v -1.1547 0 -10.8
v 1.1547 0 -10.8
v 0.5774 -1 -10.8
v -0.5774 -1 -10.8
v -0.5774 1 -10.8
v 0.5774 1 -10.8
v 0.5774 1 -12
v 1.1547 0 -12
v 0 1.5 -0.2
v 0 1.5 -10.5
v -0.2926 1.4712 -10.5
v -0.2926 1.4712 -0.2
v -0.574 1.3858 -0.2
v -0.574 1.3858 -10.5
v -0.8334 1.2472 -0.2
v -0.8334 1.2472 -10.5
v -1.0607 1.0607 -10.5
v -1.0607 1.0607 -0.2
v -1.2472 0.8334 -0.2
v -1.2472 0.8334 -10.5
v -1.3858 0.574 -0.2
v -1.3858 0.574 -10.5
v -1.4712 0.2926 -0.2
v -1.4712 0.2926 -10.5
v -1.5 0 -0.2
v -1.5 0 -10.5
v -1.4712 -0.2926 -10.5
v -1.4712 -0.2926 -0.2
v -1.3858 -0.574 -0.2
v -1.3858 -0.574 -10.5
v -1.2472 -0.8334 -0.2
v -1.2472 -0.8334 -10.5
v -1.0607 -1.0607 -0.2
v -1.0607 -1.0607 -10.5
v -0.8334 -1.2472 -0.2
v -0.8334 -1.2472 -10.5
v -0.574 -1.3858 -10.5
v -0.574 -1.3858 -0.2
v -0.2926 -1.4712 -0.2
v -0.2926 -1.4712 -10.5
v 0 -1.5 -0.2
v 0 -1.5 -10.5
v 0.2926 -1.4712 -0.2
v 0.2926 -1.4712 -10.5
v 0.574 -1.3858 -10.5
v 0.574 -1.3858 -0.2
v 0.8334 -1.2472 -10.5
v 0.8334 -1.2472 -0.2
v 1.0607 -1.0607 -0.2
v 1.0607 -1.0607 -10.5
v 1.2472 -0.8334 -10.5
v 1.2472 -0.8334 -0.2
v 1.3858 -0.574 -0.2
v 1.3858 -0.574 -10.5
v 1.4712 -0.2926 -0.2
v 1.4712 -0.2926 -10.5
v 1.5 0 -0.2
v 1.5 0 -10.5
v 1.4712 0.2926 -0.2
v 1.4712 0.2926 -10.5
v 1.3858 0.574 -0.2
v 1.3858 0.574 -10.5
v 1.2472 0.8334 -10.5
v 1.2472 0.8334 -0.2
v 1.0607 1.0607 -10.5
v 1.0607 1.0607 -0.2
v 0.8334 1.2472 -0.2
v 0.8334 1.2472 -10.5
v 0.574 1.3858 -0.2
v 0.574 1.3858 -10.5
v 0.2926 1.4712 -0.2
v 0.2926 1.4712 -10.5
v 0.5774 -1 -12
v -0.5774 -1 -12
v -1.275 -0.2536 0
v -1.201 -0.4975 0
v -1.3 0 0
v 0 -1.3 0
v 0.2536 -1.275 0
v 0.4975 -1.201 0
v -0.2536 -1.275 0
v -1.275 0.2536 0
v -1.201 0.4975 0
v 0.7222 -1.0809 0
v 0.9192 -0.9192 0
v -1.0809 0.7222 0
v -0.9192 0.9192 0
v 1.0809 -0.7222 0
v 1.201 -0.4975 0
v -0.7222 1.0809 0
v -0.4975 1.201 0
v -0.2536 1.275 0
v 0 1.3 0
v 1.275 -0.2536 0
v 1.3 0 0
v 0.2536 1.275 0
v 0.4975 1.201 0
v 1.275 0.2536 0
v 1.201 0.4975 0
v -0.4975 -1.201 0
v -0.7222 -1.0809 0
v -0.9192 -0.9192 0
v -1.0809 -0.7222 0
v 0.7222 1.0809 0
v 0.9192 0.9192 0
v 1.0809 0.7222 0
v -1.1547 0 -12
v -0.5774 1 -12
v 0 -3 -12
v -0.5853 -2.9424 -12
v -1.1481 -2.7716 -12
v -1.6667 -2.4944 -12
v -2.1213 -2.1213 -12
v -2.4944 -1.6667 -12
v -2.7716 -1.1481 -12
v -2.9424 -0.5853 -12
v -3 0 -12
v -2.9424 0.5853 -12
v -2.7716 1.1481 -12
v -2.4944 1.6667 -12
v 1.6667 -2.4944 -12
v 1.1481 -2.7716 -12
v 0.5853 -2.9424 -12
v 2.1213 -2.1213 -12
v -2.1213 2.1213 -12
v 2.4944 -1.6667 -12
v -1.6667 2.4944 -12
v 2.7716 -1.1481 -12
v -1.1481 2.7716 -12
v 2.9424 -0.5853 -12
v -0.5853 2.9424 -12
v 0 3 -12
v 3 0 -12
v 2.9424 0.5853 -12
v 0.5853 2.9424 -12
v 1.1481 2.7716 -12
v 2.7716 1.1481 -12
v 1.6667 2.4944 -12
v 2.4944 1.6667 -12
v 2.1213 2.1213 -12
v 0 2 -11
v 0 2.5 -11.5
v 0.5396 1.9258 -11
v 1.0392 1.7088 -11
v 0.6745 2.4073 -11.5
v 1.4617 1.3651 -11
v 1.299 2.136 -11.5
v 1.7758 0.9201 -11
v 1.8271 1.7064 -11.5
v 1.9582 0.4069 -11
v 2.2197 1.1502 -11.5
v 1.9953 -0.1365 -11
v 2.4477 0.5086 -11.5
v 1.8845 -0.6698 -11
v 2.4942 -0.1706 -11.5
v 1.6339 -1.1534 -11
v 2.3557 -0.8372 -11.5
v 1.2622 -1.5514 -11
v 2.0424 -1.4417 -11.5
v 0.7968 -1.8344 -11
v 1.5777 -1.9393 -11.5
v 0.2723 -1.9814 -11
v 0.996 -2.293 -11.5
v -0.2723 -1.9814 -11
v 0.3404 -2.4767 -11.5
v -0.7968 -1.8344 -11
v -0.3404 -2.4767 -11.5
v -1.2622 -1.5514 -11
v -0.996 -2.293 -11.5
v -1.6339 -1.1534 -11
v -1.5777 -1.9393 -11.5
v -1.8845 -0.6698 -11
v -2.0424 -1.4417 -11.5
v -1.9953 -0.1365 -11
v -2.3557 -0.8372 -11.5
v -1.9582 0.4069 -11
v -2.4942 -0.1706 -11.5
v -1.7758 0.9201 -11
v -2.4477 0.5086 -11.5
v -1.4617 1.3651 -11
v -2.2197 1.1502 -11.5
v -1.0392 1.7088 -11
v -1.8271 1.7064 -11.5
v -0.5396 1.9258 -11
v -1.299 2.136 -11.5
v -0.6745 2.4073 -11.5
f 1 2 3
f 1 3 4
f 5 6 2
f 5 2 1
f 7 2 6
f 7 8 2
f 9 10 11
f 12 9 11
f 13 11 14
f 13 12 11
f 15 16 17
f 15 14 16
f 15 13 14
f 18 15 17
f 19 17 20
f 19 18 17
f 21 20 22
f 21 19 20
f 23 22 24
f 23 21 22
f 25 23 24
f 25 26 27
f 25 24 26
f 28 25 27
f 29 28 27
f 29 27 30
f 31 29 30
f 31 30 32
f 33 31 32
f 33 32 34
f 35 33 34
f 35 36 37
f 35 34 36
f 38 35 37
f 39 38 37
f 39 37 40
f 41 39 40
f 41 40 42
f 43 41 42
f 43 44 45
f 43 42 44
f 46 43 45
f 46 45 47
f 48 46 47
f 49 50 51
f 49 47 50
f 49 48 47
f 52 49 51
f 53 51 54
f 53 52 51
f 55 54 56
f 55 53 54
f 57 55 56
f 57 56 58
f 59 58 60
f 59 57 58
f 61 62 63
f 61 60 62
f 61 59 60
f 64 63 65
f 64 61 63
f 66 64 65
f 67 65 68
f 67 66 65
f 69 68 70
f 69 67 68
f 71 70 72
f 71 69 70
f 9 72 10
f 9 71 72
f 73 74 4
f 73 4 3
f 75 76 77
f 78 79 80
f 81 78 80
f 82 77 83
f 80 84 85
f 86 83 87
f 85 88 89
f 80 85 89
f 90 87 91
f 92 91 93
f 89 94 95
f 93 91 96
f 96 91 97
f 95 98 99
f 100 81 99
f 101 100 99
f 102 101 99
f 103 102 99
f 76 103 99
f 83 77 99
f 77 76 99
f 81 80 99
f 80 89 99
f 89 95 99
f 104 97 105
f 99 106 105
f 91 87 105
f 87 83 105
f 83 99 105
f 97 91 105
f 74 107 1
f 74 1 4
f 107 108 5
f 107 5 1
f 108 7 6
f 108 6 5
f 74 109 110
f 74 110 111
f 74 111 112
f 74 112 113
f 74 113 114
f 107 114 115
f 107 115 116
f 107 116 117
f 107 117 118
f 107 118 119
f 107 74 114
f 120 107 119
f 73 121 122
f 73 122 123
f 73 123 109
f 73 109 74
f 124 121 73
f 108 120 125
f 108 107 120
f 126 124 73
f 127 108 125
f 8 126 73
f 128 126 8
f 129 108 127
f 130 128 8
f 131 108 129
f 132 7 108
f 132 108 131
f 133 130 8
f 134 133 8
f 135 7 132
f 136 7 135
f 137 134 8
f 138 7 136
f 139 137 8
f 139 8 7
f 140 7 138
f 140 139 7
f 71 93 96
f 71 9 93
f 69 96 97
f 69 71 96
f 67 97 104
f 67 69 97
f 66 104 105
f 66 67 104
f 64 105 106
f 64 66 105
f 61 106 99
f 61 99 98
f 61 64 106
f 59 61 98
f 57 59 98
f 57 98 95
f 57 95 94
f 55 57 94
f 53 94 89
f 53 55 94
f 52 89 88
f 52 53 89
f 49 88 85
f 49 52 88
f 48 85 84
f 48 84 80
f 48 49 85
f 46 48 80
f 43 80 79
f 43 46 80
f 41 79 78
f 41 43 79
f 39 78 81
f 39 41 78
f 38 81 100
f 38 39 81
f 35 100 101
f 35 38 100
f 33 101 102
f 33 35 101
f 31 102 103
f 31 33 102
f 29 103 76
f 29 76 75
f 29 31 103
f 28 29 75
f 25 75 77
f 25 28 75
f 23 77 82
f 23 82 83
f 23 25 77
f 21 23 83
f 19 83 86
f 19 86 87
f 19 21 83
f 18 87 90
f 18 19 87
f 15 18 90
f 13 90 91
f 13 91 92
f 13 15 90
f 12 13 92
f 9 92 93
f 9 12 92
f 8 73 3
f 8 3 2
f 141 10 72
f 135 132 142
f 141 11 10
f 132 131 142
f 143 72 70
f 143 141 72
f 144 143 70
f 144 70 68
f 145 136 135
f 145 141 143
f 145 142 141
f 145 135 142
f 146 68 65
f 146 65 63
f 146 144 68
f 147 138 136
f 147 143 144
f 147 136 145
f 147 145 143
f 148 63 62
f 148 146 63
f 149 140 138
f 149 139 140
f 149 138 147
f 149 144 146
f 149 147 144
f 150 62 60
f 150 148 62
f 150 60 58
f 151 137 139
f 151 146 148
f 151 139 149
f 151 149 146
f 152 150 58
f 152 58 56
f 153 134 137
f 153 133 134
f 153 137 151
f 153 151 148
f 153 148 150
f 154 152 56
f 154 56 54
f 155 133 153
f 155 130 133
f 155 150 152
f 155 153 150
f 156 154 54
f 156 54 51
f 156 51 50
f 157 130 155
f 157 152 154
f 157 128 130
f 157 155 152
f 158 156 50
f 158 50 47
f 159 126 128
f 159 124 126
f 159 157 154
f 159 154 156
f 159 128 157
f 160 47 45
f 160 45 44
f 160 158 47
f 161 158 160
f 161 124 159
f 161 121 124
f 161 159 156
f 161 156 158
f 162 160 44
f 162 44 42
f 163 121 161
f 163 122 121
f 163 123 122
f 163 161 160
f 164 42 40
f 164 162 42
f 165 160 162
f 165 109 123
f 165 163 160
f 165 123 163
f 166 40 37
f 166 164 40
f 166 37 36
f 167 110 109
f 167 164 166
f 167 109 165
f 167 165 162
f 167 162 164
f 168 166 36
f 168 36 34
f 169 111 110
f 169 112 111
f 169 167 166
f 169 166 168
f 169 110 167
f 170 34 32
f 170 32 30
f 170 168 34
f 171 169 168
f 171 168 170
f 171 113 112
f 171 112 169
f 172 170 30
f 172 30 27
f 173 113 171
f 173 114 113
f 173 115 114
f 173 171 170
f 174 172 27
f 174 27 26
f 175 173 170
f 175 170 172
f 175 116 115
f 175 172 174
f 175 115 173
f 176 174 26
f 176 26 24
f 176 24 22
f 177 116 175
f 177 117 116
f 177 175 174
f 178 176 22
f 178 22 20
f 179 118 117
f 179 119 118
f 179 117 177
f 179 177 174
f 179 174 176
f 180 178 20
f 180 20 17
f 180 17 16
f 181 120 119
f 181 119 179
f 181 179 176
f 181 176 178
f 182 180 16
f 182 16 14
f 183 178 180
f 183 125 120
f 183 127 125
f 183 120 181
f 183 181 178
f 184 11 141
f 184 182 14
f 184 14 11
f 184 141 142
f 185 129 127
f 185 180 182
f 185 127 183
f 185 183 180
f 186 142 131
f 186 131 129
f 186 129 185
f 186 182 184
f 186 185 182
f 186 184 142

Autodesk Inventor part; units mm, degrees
ref_plane "YZ Plane" through (0, 0, 0) normal (1, 0, 0) x (0, 1, 0)
ref_plane "XZ Plane" through (0, 0, 0) normal (0, 1, 0) x (-1, 0, 0)
ref_plane "XY Plane" through (0, 0, 0) normal (0, 0, 1) x (1, 0, 0)
sketch "Sketch1" plane through (0, 0, 0) normal (1, 0, 0) x (0, 1, 0)
  line L0 (0, 0) -> (0, -12)
  line L1 (0, -12) -> (3, -12)
  line L2 (3, -12) -> (1.5, -10.5)
  line L3 (1.5, -10.5) -> (1.5, 0)
  line L4 (1.5, 0) -> (0, 0)
  dimension "d0" = 6
  dimension "d1" = 12
  dimension "d2" = 45
  dimension "d3" = 3
revolve "Revolution1" add sketch "Sketch1" angle 360 about axis through (0, 0, 0) along (0, 0, -1)
chamfer "Chamfer1" distance 0.2 angle 45 1 edges at (0, -1.5, 0)
thread "Thread1" size "M3x0.5" class "6g" standard "ANSI Metric M Profile" full length
sketch "Sketch2" plane through (0, 0, -12) normal (0, 0, -1) x (-1, 0, 0)
  circle A0 centre (0, 0) radius 1.3 projected
  line L0 (1.1547, 0) -> (0.5774, -1)
  line L1 (0.5774, -1) -> (-0.5774, -1)
  line L2 (-0.5774, -1) -> (-1.1547, 0)
  line L3 (-1.1547, 0) -> (-0.5774, 1)
  line L4 (-0.5774, 1) -> (0.5774, 1)
  line L5 (0.5774, 1) -> (1.1547, 0)
  dimension "d10" = 2
extrude "Extrusion1" cut sketch "Sketch2" against normal blind 1.2 contours L0 L1 L2 L3 L4 L5
properties part number "M3 x 10mm FHCS"
